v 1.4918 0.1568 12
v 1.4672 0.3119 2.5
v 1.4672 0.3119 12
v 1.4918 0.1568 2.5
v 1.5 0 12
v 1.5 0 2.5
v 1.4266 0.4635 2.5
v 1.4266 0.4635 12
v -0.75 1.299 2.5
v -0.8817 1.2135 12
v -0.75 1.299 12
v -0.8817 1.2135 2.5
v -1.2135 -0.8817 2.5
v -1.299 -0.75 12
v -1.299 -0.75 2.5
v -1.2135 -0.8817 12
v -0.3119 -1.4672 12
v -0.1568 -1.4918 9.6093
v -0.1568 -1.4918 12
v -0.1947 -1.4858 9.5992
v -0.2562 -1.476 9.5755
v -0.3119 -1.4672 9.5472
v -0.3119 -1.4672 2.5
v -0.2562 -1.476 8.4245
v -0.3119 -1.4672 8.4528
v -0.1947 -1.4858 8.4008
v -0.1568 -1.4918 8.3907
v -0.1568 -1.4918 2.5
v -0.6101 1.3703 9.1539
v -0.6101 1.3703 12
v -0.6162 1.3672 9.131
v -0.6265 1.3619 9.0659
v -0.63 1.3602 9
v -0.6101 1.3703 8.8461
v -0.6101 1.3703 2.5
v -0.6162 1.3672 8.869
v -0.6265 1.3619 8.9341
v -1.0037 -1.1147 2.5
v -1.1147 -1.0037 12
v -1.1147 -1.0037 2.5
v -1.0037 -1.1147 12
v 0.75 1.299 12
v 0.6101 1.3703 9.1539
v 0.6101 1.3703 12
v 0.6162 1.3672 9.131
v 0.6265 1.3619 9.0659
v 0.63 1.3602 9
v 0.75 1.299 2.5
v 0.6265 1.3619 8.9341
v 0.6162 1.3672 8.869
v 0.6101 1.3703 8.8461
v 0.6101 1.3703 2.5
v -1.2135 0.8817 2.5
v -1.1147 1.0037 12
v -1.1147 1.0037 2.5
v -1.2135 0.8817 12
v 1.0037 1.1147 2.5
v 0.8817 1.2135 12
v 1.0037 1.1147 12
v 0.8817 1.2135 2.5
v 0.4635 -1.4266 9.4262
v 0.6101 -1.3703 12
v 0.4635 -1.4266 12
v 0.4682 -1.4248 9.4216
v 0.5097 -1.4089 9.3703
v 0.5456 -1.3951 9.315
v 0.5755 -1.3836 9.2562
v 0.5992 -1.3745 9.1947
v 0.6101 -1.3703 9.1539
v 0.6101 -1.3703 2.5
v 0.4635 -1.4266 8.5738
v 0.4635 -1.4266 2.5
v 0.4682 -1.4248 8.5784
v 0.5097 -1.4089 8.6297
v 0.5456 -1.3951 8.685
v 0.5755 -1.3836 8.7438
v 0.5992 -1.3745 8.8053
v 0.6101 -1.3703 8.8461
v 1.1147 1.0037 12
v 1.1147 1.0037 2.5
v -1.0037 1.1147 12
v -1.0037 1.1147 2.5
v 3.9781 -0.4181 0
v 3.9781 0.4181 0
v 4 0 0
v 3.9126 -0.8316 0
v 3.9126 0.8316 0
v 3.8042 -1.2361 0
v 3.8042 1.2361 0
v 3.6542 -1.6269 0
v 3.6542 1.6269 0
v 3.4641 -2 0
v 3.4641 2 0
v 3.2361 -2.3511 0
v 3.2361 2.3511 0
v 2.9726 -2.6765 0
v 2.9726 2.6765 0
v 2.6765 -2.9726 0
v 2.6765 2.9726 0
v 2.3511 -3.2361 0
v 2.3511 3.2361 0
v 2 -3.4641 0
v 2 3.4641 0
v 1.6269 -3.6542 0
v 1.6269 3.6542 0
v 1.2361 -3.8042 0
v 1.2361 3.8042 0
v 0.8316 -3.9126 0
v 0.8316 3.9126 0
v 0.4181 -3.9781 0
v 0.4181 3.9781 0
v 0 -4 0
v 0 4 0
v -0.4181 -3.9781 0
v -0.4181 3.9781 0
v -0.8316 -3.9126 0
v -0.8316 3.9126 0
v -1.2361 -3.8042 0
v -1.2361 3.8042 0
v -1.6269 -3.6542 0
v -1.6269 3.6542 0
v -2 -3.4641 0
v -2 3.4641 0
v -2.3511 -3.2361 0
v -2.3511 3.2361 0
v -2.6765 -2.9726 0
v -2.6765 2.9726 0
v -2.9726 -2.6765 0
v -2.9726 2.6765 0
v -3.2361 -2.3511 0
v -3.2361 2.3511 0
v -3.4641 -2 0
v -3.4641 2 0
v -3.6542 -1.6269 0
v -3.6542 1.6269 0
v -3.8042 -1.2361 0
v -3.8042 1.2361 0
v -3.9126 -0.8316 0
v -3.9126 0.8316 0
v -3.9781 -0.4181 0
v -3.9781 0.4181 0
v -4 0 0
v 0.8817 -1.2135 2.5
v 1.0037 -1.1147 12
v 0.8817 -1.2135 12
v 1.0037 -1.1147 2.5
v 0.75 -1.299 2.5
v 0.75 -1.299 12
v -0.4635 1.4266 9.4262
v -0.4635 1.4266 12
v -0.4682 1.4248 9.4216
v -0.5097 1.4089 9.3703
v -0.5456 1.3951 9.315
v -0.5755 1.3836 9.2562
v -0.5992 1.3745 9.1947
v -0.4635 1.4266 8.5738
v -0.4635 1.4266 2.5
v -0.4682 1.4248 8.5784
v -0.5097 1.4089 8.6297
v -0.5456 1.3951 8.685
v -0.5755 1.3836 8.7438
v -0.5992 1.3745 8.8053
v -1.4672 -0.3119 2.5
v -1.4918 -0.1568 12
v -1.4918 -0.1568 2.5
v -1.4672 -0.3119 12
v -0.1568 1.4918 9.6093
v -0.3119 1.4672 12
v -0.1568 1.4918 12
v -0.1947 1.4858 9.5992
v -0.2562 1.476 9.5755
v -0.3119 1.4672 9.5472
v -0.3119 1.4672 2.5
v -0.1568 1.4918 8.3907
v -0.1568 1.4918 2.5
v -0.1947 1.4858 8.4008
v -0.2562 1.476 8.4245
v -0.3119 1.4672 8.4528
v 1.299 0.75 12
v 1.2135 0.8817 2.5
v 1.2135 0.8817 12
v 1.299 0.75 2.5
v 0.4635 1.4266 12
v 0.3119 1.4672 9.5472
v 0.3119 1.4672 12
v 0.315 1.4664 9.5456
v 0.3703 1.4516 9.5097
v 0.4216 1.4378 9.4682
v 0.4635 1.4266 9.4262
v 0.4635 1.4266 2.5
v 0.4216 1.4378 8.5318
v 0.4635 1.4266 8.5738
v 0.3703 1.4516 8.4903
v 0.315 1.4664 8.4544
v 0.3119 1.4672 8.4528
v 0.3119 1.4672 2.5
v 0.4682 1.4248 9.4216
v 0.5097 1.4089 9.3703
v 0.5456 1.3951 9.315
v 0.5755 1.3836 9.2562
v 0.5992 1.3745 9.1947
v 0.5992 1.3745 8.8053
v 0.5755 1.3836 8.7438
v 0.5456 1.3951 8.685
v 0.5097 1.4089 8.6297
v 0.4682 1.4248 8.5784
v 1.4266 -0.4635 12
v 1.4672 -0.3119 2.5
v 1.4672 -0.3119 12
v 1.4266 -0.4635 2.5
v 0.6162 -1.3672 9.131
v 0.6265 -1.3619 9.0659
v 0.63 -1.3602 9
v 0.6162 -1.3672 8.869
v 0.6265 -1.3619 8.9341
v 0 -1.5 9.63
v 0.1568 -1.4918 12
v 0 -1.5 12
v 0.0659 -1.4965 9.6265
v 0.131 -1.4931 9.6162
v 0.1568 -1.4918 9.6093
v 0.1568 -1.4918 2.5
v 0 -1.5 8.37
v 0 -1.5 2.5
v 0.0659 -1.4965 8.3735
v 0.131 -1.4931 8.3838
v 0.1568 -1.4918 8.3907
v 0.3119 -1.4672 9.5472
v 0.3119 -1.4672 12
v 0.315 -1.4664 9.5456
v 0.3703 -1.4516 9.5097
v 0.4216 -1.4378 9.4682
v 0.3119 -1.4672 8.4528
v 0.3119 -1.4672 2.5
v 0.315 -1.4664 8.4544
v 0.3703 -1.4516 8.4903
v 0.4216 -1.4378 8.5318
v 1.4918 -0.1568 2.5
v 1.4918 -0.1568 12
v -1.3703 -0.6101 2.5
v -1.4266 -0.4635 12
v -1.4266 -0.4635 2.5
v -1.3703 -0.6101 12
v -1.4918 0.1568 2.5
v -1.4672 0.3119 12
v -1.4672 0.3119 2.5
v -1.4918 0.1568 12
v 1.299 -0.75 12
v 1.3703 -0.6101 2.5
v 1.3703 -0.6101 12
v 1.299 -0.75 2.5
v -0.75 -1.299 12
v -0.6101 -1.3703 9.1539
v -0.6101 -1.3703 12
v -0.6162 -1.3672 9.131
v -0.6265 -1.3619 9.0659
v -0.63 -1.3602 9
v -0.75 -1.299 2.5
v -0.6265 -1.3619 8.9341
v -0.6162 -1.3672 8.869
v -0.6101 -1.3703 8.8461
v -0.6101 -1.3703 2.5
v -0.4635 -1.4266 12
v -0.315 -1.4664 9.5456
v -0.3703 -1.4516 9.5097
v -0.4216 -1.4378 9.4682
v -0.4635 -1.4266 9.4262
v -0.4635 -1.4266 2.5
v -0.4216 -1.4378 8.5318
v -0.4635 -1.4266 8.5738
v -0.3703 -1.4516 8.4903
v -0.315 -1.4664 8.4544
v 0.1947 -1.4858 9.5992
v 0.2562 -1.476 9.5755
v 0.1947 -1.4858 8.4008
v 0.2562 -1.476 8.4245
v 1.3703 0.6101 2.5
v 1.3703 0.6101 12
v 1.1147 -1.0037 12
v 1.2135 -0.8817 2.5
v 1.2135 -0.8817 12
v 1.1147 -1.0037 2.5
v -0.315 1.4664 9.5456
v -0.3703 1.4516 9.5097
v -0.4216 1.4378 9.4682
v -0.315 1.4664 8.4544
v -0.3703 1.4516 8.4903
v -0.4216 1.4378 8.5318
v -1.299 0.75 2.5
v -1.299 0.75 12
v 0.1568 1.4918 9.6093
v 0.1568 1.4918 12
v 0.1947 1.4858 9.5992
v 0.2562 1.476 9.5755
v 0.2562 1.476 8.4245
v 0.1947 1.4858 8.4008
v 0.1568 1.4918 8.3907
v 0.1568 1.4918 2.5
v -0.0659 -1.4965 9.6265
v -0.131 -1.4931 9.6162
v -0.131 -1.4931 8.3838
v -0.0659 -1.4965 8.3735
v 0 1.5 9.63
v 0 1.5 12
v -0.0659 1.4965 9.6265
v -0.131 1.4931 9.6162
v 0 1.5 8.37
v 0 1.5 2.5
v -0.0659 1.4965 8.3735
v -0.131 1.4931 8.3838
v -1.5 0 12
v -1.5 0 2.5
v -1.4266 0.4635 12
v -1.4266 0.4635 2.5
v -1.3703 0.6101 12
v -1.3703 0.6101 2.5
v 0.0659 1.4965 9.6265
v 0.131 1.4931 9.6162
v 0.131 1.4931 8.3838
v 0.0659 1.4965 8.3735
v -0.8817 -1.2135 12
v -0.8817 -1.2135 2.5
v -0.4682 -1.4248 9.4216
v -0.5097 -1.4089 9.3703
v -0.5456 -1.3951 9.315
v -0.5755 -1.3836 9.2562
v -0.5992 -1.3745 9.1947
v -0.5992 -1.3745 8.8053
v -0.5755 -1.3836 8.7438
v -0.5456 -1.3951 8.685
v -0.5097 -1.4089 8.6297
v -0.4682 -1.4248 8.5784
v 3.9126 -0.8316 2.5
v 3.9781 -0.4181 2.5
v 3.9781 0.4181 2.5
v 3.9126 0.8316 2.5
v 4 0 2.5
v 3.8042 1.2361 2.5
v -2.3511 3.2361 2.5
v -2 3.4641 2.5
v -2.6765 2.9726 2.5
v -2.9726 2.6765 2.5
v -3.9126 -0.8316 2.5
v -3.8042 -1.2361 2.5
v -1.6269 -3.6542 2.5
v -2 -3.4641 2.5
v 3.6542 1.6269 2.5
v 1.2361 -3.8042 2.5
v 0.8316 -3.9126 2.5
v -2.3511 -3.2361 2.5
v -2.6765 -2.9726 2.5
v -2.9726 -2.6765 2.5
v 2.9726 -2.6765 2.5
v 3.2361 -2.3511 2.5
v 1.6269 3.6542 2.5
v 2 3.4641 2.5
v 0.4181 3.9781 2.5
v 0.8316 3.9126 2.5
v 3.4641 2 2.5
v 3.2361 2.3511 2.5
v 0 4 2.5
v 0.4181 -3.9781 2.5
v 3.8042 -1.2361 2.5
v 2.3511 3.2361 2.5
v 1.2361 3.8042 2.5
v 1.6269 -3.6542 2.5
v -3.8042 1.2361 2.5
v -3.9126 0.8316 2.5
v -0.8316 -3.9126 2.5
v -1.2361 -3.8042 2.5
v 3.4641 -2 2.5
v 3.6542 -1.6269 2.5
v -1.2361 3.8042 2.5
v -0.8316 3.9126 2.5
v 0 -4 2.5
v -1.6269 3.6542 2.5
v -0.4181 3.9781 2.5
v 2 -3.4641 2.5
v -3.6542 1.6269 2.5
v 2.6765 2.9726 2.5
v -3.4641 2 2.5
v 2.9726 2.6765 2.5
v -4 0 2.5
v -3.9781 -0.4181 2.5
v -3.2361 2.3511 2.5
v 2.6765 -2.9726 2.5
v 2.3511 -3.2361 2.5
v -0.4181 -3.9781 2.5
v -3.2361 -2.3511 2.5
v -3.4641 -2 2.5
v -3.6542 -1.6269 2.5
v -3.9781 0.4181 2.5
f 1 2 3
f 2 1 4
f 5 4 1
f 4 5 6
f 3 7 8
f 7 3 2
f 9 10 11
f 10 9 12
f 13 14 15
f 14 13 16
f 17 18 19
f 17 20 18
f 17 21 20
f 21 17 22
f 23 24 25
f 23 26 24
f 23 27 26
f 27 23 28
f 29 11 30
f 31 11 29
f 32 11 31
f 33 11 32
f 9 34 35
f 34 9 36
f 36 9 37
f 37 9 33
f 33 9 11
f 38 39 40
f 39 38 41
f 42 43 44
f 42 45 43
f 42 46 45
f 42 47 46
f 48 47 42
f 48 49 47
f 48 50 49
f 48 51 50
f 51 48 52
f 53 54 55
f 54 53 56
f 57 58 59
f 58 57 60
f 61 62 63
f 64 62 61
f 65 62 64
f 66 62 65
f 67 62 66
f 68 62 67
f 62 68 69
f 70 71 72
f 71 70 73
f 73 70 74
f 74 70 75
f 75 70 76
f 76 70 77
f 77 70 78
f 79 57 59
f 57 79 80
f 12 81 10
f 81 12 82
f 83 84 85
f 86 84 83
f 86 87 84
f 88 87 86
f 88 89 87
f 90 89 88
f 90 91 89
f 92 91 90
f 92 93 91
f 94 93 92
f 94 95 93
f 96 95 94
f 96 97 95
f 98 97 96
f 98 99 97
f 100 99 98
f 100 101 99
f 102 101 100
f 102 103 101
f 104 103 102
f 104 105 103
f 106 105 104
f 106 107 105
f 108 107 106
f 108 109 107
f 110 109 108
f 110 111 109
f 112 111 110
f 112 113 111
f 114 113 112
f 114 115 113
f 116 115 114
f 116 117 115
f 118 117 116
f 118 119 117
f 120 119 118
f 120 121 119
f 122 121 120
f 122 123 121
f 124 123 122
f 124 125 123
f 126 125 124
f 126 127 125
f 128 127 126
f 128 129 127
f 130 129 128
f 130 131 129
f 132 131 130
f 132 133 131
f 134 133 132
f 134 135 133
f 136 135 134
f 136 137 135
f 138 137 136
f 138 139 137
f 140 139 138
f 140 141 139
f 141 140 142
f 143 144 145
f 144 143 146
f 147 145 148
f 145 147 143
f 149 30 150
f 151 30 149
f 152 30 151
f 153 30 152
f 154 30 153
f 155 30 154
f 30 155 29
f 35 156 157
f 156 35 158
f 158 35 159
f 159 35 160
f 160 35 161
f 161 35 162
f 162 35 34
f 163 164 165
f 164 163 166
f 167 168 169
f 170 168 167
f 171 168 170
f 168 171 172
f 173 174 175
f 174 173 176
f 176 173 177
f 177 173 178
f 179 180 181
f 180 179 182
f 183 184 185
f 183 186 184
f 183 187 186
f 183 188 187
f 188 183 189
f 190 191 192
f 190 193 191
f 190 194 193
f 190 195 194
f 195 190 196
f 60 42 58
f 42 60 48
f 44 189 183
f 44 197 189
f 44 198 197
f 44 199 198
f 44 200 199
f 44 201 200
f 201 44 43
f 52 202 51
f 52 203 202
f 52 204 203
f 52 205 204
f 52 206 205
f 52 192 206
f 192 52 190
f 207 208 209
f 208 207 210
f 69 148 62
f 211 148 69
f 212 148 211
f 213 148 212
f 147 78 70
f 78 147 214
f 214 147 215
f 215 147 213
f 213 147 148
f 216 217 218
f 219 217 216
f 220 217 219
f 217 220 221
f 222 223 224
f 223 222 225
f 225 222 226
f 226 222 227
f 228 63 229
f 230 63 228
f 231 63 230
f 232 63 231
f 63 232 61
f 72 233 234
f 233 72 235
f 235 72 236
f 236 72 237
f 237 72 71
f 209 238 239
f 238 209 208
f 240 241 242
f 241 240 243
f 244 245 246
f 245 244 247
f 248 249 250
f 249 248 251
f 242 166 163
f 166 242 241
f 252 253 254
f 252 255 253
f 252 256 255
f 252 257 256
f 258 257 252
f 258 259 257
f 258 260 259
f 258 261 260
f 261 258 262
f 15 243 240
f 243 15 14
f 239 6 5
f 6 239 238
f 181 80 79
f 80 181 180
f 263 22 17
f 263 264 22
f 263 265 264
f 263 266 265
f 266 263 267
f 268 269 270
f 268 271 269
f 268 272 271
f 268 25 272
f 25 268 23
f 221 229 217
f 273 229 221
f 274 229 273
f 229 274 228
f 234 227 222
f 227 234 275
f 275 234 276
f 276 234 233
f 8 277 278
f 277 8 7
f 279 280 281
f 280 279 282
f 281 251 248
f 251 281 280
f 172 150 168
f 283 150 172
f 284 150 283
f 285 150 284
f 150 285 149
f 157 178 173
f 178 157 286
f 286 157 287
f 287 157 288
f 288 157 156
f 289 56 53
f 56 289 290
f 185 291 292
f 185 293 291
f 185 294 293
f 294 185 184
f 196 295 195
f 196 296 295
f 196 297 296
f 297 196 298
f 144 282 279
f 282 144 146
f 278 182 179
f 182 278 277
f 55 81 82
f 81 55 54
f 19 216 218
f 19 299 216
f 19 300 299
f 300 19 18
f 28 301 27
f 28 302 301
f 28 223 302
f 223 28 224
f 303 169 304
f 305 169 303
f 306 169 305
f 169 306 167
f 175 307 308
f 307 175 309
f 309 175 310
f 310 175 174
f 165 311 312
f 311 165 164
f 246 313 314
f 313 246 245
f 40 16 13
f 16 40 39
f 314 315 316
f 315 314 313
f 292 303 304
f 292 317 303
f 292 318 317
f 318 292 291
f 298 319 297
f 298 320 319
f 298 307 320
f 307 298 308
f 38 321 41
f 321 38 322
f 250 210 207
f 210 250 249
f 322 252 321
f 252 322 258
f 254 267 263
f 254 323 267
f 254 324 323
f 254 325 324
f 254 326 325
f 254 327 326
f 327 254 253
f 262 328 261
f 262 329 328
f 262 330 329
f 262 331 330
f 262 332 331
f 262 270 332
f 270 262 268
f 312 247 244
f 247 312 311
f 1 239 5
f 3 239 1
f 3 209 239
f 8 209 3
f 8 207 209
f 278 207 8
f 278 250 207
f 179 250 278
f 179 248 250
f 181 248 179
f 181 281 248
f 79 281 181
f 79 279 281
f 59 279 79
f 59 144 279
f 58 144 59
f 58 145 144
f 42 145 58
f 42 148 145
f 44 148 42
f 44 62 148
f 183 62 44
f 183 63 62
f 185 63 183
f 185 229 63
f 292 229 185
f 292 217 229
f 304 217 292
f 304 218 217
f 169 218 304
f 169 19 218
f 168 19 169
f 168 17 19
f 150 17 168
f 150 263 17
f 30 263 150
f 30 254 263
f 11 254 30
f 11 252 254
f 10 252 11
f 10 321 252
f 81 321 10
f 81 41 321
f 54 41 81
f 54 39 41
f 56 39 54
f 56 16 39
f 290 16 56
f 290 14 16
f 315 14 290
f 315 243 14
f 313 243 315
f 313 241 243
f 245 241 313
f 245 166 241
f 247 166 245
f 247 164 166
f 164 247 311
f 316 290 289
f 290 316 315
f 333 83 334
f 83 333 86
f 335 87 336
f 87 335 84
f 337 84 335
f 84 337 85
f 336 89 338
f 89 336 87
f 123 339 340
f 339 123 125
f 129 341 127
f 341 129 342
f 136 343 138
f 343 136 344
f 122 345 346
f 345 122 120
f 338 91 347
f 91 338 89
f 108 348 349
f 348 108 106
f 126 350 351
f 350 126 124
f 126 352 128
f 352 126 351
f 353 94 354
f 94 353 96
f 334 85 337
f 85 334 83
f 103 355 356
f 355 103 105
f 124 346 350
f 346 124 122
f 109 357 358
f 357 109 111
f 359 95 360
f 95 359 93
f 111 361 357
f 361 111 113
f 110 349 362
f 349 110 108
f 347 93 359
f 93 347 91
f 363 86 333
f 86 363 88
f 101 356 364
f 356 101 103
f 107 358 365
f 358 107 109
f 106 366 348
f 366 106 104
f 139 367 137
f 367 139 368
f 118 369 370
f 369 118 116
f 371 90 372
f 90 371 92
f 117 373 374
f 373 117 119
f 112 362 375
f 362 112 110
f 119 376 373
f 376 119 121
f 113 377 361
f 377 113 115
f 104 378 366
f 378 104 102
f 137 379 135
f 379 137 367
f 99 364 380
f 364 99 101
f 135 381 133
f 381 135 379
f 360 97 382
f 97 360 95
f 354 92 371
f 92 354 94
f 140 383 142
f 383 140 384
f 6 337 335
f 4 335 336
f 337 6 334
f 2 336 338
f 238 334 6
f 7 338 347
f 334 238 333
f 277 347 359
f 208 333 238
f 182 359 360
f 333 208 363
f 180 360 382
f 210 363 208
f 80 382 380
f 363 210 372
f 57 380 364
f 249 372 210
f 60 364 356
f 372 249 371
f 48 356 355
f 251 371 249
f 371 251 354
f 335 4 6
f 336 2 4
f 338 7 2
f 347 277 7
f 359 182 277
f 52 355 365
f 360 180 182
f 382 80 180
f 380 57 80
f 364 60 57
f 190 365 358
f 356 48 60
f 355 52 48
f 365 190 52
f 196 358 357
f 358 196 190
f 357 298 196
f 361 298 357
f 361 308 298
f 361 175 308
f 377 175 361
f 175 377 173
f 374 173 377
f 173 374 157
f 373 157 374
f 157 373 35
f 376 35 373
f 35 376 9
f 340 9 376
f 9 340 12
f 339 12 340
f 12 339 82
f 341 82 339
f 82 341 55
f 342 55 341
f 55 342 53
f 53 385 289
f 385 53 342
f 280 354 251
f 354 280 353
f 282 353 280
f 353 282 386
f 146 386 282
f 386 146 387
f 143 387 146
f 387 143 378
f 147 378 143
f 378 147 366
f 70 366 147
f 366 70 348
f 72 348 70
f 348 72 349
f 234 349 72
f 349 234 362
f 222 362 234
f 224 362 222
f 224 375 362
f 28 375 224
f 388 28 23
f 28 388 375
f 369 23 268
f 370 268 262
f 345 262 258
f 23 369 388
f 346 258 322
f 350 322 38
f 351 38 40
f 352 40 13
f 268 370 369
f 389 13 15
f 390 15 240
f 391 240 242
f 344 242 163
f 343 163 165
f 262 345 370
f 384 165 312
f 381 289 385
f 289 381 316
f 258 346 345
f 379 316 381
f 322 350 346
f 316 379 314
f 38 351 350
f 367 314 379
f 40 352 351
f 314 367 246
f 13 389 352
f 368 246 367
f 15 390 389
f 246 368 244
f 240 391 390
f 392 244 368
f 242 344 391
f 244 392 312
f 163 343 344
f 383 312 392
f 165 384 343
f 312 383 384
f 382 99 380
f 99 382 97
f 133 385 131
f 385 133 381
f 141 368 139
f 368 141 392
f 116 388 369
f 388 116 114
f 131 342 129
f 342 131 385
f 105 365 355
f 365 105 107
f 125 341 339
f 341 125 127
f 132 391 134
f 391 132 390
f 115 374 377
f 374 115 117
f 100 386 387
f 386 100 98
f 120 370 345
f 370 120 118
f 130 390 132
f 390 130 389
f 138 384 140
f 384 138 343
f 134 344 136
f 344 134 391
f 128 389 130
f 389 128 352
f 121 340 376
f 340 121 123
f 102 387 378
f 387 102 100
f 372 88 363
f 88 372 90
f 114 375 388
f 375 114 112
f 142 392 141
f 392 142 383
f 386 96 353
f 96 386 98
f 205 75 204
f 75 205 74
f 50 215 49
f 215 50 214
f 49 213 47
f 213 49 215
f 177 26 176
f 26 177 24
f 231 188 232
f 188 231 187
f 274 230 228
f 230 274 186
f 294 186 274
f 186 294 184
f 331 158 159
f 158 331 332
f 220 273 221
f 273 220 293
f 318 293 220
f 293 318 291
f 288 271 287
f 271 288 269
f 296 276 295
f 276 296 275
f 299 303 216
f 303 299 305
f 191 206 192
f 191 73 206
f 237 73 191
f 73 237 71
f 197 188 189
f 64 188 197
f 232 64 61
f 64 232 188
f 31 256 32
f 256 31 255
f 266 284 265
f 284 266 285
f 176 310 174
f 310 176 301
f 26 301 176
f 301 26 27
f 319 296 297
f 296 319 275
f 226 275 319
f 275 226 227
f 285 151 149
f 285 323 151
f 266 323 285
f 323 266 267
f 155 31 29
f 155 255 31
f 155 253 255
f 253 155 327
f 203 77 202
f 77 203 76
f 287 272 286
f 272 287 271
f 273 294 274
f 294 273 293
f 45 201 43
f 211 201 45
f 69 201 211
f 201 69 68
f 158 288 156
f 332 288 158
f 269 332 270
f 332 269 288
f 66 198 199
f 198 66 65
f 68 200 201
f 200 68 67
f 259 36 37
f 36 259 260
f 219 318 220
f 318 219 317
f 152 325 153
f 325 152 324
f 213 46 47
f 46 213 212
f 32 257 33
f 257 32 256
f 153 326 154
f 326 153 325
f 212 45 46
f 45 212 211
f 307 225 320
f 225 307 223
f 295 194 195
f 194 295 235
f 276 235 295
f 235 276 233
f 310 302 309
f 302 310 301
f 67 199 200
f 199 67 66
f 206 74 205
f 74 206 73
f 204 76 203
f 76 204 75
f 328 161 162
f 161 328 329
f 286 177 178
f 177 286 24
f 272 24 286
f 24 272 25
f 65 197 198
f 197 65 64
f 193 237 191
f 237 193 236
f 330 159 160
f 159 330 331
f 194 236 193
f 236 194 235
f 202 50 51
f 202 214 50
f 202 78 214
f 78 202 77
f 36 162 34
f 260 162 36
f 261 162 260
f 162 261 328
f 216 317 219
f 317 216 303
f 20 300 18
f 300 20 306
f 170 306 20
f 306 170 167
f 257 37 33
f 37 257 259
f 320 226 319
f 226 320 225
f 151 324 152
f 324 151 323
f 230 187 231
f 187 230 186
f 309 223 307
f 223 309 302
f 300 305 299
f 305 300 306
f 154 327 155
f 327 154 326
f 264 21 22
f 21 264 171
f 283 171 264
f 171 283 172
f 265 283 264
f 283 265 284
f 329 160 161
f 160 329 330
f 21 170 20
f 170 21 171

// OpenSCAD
// Clevis pin with cross-hole.
$fn = 60;
eps = 0.02;
pin_d = 3;
pin_l = 12;
head_d = pin_d + 5;
difference() {
    union() { cylinder(d=pin_d,h=pin_l); cylinder(d=head_d,h=2.5); }
    translate([0,-pin_d-eps,pin_l-3]) rotate([-90,0,0]) cylinder(d=pin_d*0.42,h=2*pin_d+2*eps);
}
